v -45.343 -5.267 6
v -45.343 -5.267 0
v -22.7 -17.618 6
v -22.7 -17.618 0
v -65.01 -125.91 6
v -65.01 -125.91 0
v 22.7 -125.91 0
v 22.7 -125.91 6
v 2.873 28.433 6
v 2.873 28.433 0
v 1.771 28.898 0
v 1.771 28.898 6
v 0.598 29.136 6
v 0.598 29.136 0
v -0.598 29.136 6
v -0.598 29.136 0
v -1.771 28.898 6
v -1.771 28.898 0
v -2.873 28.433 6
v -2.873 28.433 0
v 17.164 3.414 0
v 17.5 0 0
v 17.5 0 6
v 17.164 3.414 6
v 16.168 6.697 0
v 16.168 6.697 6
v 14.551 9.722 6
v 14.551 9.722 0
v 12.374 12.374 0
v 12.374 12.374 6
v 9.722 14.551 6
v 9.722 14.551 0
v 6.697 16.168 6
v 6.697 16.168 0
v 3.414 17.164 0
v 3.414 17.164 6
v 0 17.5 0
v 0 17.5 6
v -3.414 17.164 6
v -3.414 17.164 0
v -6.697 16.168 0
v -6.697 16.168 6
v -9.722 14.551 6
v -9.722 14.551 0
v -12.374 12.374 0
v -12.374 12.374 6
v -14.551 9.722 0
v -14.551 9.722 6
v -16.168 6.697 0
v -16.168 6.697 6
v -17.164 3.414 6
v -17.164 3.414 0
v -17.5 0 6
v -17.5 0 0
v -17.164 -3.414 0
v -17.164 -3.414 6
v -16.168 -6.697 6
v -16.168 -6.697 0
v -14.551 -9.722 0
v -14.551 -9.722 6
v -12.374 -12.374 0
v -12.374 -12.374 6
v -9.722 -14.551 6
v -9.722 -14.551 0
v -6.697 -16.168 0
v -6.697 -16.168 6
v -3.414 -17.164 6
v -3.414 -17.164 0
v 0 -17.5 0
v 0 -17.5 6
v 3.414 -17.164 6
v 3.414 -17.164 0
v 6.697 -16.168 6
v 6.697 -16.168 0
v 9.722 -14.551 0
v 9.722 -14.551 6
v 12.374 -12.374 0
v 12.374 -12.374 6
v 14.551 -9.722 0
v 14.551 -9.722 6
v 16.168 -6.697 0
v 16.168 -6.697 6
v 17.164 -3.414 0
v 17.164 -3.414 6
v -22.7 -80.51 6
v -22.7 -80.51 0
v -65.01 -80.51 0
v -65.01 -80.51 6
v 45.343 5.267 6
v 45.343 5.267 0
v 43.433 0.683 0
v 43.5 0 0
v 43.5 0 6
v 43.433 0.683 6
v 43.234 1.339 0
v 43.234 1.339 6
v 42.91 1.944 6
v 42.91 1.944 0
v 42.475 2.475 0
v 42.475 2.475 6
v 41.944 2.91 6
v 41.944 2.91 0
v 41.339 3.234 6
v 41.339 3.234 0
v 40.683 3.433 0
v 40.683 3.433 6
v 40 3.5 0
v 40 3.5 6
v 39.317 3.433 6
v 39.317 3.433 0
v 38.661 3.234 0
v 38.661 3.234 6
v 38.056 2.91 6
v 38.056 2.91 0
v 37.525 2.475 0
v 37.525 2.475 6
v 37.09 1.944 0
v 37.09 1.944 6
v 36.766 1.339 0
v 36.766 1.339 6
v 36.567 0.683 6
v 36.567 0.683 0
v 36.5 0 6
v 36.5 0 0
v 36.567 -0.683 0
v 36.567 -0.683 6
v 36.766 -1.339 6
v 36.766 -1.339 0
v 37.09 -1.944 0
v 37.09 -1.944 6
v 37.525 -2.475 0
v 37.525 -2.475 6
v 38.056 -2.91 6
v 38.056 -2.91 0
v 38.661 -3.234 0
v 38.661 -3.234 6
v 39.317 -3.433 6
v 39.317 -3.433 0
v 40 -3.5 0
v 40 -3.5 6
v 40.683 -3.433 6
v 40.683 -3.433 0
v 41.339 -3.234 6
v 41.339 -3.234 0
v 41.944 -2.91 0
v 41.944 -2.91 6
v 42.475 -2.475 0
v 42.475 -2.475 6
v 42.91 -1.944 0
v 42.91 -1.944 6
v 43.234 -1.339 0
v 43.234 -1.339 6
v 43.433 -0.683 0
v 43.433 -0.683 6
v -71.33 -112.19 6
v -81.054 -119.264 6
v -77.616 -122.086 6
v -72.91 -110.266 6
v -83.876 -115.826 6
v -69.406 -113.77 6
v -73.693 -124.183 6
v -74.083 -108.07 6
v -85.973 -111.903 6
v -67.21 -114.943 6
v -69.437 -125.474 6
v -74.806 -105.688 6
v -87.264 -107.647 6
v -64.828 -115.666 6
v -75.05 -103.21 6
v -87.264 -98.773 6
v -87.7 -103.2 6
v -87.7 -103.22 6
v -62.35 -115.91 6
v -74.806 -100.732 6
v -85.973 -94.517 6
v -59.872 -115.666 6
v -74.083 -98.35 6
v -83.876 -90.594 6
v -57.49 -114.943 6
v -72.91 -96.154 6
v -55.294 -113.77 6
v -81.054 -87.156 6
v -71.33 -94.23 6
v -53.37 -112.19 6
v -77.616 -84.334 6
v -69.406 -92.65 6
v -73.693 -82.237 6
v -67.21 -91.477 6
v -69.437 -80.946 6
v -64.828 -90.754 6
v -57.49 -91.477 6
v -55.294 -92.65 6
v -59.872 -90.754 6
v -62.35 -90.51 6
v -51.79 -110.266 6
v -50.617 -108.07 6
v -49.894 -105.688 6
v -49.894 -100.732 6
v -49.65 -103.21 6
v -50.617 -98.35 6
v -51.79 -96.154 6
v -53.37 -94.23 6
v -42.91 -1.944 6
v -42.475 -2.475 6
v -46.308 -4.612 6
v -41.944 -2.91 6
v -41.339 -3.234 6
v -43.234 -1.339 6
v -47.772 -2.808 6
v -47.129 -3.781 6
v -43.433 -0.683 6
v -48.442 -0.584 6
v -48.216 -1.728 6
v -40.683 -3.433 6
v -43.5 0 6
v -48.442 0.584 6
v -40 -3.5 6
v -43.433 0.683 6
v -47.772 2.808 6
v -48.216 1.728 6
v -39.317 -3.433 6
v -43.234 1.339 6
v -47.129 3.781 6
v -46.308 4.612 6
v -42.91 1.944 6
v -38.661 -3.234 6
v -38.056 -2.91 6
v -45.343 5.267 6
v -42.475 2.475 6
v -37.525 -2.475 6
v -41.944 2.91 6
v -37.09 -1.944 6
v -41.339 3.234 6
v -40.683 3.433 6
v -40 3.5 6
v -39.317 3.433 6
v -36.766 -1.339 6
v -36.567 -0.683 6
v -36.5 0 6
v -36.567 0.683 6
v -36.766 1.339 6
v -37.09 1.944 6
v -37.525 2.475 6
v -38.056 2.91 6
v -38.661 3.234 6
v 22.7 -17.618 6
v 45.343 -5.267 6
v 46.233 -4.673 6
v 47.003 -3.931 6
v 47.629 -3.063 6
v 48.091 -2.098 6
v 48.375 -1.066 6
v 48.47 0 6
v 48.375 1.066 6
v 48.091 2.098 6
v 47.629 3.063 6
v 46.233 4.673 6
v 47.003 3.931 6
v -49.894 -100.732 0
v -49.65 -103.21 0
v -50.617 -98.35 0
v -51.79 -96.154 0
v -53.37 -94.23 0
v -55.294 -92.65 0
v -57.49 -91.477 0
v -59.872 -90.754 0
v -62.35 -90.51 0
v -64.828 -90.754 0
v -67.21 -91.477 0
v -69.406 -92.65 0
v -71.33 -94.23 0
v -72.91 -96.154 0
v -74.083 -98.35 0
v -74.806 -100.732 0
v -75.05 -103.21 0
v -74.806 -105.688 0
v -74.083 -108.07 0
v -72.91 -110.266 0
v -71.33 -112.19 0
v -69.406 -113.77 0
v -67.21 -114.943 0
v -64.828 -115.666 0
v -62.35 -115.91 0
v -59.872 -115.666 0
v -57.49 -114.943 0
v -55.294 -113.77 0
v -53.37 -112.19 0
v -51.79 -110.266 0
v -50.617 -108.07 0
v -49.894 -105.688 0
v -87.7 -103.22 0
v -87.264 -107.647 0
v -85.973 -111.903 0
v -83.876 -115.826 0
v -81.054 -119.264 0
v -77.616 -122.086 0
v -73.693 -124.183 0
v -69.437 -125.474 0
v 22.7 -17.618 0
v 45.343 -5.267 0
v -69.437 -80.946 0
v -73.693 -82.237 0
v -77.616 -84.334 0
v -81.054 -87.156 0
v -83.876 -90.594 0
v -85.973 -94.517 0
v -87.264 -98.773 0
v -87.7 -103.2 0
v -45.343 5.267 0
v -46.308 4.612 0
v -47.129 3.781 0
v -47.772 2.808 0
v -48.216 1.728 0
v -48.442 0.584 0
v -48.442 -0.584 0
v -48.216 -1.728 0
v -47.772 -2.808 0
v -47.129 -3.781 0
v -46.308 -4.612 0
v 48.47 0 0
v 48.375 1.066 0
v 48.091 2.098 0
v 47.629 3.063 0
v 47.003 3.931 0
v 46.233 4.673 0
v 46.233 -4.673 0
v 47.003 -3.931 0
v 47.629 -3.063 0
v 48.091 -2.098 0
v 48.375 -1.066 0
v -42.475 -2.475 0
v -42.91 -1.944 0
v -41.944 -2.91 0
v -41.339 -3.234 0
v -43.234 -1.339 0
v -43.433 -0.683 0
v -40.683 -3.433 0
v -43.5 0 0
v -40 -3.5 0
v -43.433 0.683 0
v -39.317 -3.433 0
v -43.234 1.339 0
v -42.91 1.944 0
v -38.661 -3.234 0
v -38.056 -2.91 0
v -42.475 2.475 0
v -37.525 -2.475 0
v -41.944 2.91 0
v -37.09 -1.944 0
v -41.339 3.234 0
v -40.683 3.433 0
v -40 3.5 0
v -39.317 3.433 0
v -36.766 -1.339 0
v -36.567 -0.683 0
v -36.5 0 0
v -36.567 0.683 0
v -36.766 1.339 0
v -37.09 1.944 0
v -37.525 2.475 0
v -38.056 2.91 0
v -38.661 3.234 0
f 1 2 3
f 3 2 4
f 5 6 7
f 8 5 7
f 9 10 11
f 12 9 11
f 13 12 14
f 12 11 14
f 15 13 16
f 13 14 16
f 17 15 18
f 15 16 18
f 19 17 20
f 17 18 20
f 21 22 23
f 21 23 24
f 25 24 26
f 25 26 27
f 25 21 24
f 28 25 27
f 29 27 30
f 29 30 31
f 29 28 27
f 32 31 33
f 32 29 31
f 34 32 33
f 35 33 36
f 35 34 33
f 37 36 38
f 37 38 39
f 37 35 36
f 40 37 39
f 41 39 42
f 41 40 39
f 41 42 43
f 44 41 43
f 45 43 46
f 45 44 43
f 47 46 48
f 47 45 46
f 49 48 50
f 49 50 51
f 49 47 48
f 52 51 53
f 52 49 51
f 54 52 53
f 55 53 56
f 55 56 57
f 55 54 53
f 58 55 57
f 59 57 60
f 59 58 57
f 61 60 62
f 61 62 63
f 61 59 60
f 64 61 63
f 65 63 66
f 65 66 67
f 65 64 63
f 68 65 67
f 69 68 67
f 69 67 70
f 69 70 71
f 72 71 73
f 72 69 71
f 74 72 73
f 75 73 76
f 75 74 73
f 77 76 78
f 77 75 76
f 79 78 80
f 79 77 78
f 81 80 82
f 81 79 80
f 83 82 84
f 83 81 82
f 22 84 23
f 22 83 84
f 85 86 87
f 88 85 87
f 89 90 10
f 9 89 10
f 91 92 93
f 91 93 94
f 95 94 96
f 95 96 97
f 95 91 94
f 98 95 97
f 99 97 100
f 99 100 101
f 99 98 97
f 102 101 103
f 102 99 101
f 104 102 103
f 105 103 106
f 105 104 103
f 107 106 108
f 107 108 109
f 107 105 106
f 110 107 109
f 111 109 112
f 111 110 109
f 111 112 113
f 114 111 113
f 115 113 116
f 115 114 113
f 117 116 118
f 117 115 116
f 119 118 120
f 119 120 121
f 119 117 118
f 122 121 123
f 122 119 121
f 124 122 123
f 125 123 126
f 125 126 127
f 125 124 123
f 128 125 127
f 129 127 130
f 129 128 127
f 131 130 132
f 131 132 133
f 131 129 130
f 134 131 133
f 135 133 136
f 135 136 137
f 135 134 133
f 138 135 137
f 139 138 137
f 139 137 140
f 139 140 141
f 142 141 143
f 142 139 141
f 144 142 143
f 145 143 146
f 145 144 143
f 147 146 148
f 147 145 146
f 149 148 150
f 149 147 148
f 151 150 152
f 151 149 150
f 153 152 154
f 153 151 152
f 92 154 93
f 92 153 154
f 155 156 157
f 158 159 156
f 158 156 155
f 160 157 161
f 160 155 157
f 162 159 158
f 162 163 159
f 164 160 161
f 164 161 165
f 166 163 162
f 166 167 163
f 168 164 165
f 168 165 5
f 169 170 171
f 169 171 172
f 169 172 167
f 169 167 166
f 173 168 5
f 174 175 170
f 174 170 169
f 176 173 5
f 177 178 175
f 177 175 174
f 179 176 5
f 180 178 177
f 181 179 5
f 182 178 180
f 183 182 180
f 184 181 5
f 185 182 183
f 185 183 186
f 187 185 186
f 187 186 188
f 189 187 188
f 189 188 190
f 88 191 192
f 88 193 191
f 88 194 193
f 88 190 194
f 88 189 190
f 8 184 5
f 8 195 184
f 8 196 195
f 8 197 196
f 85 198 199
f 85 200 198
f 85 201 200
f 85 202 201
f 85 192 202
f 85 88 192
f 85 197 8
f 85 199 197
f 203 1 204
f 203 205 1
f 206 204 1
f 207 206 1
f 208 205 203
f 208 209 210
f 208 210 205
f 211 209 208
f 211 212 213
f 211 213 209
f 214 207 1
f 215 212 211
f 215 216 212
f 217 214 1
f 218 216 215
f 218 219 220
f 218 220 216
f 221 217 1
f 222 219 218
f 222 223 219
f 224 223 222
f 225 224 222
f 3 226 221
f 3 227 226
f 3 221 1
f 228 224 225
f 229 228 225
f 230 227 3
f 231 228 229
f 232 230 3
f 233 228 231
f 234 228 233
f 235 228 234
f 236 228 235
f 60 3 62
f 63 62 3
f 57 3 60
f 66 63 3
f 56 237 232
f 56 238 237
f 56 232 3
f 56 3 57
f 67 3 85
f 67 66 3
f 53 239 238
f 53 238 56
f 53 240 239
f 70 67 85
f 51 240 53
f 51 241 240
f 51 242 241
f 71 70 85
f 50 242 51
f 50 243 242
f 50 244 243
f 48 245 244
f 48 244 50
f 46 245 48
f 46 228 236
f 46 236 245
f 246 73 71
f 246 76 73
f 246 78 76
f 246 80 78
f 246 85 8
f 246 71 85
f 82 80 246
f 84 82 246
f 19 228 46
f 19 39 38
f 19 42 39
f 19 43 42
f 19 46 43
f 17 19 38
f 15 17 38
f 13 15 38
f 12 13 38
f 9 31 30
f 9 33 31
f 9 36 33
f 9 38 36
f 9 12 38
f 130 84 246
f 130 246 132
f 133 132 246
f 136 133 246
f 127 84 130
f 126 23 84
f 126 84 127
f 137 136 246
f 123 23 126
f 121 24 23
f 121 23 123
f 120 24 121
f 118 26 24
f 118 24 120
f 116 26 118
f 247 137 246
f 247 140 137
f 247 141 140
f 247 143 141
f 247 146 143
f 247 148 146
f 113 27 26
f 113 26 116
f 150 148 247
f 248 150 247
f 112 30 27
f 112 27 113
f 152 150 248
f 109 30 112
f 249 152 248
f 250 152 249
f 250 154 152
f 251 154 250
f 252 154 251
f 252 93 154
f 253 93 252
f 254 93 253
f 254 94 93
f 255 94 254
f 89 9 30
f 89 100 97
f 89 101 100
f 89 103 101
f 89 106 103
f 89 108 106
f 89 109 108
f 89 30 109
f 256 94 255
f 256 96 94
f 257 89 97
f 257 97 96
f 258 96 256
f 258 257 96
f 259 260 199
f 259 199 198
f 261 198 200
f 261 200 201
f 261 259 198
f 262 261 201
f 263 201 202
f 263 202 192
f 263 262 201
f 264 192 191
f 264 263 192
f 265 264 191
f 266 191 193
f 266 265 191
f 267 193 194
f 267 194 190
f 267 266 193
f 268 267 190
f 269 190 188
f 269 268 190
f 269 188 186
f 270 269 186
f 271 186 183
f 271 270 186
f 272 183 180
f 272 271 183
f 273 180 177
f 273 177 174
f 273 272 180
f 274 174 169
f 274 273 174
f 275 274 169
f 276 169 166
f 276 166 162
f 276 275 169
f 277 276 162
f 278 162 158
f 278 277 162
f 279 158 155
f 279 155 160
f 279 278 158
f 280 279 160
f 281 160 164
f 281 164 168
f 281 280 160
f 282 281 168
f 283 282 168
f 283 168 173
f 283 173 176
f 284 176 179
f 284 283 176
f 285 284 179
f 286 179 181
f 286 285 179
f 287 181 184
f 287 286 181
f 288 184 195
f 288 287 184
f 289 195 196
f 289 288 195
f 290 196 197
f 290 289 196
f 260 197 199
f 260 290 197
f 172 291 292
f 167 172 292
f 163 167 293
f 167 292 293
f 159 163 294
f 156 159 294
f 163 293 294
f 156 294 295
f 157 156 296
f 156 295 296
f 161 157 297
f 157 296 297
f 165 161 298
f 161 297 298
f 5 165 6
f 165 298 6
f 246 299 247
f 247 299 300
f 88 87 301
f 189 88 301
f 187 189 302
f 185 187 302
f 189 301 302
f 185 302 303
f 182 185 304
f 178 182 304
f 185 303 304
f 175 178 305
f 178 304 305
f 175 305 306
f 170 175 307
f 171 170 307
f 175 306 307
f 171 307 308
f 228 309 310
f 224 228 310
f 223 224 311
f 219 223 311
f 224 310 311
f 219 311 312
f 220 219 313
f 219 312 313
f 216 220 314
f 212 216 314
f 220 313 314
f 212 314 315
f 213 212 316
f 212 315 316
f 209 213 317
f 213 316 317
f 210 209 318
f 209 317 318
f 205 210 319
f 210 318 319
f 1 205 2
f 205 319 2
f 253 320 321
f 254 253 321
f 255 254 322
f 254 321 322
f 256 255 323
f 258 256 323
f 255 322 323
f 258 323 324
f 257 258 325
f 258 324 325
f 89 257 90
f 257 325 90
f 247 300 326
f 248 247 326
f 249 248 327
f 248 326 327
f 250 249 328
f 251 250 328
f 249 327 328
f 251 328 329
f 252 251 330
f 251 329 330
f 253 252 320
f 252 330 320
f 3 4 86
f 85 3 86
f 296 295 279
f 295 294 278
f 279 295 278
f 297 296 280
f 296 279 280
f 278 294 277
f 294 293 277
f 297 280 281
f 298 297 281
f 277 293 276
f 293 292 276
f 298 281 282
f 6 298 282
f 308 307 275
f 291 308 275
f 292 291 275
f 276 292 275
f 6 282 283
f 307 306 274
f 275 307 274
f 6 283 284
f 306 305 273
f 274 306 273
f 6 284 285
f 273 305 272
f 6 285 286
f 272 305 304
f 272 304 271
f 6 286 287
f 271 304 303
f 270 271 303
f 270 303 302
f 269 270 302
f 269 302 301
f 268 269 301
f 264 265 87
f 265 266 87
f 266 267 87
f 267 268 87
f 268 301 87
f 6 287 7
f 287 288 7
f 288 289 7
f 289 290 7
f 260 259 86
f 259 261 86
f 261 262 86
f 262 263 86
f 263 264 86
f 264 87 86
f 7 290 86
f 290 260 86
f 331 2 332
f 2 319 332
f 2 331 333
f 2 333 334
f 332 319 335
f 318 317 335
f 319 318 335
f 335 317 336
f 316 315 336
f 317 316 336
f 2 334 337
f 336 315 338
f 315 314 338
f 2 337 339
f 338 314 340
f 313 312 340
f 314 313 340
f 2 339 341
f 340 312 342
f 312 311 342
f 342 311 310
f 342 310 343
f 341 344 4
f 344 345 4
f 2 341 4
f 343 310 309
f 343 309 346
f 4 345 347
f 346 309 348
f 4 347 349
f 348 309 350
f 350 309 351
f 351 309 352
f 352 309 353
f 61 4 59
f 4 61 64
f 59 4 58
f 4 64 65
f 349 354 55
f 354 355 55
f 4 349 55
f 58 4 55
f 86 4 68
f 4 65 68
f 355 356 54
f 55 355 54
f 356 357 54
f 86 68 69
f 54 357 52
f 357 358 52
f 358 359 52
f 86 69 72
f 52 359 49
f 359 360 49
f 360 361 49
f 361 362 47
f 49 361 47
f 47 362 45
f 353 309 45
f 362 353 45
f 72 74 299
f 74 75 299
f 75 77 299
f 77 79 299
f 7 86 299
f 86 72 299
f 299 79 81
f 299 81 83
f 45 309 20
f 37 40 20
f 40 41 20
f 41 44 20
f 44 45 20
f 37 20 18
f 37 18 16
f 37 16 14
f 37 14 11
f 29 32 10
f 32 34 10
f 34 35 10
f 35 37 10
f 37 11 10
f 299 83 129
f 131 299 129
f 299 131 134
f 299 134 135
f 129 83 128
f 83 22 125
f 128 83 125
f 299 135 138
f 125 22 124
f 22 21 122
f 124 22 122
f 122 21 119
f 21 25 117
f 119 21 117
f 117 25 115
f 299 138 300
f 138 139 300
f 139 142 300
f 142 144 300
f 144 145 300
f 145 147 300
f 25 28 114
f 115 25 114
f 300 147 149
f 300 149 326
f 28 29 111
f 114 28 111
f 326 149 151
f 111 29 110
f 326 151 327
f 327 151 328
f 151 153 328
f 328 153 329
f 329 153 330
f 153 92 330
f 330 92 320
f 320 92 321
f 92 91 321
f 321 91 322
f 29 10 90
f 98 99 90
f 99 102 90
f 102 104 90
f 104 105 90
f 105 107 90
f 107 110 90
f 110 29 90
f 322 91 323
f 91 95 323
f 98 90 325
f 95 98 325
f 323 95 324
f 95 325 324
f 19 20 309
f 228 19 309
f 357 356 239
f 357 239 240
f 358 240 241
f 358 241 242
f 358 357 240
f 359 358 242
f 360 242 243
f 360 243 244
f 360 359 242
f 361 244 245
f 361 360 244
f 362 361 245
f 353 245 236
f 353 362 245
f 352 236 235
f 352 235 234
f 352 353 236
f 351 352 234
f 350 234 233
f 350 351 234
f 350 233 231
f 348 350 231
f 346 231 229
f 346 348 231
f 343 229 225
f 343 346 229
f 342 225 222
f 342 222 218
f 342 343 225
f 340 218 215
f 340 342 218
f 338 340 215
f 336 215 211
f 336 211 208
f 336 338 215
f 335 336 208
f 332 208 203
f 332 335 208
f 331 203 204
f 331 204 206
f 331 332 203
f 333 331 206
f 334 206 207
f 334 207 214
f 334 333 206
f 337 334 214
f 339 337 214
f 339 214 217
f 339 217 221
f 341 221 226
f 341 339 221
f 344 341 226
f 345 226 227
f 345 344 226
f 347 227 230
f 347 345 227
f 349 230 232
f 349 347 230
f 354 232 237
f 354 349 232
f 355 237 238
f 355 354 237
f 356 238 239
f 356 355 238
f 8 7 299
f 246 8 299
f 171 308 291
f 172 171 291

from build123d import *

# Parameters (mm, degrees)
SKETCH1_R           = 3.5
SKETCH1_R_2         = 17.5
SKETCH1_R_3         = 12.7
BOSS_EXTRUDE1_DEPTH = 6


with BuildPart() as part:
    # Sketch1 → Boss-Extrude1 (new body)
    with BuildSketch(Plane.XY):
        with BuildLine():
            Line((-45.343148698, -5.267373437), (-22.7, -17.618181818))
            Line((-22.7, -17.618181818), (-22.7, -80.51))
            Line((-22.7, -80.51), (-65.01, -80.51))
            ThreePointArc((-65.01, -80.51), (-81.054252865, -87.155747135), (-87.7, -103.2))
            Line((-87.7, -103.2), (-87.7, -103.22))
            ThreePointArc((-87.7, -103.22), (-81.054252865, -119.264252865), (-65.01, -125.91))
            Line((-65.01, -125.91), (22.7, -125.91))
            Line((22.7, -125.91), (22.7, -17.618181818))
            Line((22.7, -17.618181818), (45.343148698, -5.267373437))
            ThreePointArc((45.343148698, -5.267373437), (47.629429129, -3.062786582), (48.470035914, 0))
            ThreePointArc((48.470035914, 0), (47.629429129, 3.062786582), (45.343148698, 5.267373437))
            Line((45.343148698, 5.267373437), (2.873112784, 28.432847572))
            ThreePointArc((2.873112784, 28.432847572), (0, 29.165474135), (-2.873112784, 28.432847572))
            Line((-2.873112784, 28.432847572), (-45.343148698, 5.267373437))
            ThreePointArc((-45.343148698, 5.267373437), (-48.470035914, 0), (-45.343148698, -5.267373437))
        make_face()
        with Locations((-40, 0)):
            Circle(SKETCH1_R, mode=Mode.SUBTRACT)
        Circle(SKETCH1_R_2, mode=Mode.SUBTRACT)
        with Locations((40, 0)):
            Circle(SKETCH1_R, mode=Mode.SUBTRACT)
        with Locations((-62.35, -103.21)):
            Circle(SKETCH1_R_3, mode=Mode.SUBTRACT)
    extrude(amount=BOSS_EXTRUDE1_DEPTH)


solid = part.part
